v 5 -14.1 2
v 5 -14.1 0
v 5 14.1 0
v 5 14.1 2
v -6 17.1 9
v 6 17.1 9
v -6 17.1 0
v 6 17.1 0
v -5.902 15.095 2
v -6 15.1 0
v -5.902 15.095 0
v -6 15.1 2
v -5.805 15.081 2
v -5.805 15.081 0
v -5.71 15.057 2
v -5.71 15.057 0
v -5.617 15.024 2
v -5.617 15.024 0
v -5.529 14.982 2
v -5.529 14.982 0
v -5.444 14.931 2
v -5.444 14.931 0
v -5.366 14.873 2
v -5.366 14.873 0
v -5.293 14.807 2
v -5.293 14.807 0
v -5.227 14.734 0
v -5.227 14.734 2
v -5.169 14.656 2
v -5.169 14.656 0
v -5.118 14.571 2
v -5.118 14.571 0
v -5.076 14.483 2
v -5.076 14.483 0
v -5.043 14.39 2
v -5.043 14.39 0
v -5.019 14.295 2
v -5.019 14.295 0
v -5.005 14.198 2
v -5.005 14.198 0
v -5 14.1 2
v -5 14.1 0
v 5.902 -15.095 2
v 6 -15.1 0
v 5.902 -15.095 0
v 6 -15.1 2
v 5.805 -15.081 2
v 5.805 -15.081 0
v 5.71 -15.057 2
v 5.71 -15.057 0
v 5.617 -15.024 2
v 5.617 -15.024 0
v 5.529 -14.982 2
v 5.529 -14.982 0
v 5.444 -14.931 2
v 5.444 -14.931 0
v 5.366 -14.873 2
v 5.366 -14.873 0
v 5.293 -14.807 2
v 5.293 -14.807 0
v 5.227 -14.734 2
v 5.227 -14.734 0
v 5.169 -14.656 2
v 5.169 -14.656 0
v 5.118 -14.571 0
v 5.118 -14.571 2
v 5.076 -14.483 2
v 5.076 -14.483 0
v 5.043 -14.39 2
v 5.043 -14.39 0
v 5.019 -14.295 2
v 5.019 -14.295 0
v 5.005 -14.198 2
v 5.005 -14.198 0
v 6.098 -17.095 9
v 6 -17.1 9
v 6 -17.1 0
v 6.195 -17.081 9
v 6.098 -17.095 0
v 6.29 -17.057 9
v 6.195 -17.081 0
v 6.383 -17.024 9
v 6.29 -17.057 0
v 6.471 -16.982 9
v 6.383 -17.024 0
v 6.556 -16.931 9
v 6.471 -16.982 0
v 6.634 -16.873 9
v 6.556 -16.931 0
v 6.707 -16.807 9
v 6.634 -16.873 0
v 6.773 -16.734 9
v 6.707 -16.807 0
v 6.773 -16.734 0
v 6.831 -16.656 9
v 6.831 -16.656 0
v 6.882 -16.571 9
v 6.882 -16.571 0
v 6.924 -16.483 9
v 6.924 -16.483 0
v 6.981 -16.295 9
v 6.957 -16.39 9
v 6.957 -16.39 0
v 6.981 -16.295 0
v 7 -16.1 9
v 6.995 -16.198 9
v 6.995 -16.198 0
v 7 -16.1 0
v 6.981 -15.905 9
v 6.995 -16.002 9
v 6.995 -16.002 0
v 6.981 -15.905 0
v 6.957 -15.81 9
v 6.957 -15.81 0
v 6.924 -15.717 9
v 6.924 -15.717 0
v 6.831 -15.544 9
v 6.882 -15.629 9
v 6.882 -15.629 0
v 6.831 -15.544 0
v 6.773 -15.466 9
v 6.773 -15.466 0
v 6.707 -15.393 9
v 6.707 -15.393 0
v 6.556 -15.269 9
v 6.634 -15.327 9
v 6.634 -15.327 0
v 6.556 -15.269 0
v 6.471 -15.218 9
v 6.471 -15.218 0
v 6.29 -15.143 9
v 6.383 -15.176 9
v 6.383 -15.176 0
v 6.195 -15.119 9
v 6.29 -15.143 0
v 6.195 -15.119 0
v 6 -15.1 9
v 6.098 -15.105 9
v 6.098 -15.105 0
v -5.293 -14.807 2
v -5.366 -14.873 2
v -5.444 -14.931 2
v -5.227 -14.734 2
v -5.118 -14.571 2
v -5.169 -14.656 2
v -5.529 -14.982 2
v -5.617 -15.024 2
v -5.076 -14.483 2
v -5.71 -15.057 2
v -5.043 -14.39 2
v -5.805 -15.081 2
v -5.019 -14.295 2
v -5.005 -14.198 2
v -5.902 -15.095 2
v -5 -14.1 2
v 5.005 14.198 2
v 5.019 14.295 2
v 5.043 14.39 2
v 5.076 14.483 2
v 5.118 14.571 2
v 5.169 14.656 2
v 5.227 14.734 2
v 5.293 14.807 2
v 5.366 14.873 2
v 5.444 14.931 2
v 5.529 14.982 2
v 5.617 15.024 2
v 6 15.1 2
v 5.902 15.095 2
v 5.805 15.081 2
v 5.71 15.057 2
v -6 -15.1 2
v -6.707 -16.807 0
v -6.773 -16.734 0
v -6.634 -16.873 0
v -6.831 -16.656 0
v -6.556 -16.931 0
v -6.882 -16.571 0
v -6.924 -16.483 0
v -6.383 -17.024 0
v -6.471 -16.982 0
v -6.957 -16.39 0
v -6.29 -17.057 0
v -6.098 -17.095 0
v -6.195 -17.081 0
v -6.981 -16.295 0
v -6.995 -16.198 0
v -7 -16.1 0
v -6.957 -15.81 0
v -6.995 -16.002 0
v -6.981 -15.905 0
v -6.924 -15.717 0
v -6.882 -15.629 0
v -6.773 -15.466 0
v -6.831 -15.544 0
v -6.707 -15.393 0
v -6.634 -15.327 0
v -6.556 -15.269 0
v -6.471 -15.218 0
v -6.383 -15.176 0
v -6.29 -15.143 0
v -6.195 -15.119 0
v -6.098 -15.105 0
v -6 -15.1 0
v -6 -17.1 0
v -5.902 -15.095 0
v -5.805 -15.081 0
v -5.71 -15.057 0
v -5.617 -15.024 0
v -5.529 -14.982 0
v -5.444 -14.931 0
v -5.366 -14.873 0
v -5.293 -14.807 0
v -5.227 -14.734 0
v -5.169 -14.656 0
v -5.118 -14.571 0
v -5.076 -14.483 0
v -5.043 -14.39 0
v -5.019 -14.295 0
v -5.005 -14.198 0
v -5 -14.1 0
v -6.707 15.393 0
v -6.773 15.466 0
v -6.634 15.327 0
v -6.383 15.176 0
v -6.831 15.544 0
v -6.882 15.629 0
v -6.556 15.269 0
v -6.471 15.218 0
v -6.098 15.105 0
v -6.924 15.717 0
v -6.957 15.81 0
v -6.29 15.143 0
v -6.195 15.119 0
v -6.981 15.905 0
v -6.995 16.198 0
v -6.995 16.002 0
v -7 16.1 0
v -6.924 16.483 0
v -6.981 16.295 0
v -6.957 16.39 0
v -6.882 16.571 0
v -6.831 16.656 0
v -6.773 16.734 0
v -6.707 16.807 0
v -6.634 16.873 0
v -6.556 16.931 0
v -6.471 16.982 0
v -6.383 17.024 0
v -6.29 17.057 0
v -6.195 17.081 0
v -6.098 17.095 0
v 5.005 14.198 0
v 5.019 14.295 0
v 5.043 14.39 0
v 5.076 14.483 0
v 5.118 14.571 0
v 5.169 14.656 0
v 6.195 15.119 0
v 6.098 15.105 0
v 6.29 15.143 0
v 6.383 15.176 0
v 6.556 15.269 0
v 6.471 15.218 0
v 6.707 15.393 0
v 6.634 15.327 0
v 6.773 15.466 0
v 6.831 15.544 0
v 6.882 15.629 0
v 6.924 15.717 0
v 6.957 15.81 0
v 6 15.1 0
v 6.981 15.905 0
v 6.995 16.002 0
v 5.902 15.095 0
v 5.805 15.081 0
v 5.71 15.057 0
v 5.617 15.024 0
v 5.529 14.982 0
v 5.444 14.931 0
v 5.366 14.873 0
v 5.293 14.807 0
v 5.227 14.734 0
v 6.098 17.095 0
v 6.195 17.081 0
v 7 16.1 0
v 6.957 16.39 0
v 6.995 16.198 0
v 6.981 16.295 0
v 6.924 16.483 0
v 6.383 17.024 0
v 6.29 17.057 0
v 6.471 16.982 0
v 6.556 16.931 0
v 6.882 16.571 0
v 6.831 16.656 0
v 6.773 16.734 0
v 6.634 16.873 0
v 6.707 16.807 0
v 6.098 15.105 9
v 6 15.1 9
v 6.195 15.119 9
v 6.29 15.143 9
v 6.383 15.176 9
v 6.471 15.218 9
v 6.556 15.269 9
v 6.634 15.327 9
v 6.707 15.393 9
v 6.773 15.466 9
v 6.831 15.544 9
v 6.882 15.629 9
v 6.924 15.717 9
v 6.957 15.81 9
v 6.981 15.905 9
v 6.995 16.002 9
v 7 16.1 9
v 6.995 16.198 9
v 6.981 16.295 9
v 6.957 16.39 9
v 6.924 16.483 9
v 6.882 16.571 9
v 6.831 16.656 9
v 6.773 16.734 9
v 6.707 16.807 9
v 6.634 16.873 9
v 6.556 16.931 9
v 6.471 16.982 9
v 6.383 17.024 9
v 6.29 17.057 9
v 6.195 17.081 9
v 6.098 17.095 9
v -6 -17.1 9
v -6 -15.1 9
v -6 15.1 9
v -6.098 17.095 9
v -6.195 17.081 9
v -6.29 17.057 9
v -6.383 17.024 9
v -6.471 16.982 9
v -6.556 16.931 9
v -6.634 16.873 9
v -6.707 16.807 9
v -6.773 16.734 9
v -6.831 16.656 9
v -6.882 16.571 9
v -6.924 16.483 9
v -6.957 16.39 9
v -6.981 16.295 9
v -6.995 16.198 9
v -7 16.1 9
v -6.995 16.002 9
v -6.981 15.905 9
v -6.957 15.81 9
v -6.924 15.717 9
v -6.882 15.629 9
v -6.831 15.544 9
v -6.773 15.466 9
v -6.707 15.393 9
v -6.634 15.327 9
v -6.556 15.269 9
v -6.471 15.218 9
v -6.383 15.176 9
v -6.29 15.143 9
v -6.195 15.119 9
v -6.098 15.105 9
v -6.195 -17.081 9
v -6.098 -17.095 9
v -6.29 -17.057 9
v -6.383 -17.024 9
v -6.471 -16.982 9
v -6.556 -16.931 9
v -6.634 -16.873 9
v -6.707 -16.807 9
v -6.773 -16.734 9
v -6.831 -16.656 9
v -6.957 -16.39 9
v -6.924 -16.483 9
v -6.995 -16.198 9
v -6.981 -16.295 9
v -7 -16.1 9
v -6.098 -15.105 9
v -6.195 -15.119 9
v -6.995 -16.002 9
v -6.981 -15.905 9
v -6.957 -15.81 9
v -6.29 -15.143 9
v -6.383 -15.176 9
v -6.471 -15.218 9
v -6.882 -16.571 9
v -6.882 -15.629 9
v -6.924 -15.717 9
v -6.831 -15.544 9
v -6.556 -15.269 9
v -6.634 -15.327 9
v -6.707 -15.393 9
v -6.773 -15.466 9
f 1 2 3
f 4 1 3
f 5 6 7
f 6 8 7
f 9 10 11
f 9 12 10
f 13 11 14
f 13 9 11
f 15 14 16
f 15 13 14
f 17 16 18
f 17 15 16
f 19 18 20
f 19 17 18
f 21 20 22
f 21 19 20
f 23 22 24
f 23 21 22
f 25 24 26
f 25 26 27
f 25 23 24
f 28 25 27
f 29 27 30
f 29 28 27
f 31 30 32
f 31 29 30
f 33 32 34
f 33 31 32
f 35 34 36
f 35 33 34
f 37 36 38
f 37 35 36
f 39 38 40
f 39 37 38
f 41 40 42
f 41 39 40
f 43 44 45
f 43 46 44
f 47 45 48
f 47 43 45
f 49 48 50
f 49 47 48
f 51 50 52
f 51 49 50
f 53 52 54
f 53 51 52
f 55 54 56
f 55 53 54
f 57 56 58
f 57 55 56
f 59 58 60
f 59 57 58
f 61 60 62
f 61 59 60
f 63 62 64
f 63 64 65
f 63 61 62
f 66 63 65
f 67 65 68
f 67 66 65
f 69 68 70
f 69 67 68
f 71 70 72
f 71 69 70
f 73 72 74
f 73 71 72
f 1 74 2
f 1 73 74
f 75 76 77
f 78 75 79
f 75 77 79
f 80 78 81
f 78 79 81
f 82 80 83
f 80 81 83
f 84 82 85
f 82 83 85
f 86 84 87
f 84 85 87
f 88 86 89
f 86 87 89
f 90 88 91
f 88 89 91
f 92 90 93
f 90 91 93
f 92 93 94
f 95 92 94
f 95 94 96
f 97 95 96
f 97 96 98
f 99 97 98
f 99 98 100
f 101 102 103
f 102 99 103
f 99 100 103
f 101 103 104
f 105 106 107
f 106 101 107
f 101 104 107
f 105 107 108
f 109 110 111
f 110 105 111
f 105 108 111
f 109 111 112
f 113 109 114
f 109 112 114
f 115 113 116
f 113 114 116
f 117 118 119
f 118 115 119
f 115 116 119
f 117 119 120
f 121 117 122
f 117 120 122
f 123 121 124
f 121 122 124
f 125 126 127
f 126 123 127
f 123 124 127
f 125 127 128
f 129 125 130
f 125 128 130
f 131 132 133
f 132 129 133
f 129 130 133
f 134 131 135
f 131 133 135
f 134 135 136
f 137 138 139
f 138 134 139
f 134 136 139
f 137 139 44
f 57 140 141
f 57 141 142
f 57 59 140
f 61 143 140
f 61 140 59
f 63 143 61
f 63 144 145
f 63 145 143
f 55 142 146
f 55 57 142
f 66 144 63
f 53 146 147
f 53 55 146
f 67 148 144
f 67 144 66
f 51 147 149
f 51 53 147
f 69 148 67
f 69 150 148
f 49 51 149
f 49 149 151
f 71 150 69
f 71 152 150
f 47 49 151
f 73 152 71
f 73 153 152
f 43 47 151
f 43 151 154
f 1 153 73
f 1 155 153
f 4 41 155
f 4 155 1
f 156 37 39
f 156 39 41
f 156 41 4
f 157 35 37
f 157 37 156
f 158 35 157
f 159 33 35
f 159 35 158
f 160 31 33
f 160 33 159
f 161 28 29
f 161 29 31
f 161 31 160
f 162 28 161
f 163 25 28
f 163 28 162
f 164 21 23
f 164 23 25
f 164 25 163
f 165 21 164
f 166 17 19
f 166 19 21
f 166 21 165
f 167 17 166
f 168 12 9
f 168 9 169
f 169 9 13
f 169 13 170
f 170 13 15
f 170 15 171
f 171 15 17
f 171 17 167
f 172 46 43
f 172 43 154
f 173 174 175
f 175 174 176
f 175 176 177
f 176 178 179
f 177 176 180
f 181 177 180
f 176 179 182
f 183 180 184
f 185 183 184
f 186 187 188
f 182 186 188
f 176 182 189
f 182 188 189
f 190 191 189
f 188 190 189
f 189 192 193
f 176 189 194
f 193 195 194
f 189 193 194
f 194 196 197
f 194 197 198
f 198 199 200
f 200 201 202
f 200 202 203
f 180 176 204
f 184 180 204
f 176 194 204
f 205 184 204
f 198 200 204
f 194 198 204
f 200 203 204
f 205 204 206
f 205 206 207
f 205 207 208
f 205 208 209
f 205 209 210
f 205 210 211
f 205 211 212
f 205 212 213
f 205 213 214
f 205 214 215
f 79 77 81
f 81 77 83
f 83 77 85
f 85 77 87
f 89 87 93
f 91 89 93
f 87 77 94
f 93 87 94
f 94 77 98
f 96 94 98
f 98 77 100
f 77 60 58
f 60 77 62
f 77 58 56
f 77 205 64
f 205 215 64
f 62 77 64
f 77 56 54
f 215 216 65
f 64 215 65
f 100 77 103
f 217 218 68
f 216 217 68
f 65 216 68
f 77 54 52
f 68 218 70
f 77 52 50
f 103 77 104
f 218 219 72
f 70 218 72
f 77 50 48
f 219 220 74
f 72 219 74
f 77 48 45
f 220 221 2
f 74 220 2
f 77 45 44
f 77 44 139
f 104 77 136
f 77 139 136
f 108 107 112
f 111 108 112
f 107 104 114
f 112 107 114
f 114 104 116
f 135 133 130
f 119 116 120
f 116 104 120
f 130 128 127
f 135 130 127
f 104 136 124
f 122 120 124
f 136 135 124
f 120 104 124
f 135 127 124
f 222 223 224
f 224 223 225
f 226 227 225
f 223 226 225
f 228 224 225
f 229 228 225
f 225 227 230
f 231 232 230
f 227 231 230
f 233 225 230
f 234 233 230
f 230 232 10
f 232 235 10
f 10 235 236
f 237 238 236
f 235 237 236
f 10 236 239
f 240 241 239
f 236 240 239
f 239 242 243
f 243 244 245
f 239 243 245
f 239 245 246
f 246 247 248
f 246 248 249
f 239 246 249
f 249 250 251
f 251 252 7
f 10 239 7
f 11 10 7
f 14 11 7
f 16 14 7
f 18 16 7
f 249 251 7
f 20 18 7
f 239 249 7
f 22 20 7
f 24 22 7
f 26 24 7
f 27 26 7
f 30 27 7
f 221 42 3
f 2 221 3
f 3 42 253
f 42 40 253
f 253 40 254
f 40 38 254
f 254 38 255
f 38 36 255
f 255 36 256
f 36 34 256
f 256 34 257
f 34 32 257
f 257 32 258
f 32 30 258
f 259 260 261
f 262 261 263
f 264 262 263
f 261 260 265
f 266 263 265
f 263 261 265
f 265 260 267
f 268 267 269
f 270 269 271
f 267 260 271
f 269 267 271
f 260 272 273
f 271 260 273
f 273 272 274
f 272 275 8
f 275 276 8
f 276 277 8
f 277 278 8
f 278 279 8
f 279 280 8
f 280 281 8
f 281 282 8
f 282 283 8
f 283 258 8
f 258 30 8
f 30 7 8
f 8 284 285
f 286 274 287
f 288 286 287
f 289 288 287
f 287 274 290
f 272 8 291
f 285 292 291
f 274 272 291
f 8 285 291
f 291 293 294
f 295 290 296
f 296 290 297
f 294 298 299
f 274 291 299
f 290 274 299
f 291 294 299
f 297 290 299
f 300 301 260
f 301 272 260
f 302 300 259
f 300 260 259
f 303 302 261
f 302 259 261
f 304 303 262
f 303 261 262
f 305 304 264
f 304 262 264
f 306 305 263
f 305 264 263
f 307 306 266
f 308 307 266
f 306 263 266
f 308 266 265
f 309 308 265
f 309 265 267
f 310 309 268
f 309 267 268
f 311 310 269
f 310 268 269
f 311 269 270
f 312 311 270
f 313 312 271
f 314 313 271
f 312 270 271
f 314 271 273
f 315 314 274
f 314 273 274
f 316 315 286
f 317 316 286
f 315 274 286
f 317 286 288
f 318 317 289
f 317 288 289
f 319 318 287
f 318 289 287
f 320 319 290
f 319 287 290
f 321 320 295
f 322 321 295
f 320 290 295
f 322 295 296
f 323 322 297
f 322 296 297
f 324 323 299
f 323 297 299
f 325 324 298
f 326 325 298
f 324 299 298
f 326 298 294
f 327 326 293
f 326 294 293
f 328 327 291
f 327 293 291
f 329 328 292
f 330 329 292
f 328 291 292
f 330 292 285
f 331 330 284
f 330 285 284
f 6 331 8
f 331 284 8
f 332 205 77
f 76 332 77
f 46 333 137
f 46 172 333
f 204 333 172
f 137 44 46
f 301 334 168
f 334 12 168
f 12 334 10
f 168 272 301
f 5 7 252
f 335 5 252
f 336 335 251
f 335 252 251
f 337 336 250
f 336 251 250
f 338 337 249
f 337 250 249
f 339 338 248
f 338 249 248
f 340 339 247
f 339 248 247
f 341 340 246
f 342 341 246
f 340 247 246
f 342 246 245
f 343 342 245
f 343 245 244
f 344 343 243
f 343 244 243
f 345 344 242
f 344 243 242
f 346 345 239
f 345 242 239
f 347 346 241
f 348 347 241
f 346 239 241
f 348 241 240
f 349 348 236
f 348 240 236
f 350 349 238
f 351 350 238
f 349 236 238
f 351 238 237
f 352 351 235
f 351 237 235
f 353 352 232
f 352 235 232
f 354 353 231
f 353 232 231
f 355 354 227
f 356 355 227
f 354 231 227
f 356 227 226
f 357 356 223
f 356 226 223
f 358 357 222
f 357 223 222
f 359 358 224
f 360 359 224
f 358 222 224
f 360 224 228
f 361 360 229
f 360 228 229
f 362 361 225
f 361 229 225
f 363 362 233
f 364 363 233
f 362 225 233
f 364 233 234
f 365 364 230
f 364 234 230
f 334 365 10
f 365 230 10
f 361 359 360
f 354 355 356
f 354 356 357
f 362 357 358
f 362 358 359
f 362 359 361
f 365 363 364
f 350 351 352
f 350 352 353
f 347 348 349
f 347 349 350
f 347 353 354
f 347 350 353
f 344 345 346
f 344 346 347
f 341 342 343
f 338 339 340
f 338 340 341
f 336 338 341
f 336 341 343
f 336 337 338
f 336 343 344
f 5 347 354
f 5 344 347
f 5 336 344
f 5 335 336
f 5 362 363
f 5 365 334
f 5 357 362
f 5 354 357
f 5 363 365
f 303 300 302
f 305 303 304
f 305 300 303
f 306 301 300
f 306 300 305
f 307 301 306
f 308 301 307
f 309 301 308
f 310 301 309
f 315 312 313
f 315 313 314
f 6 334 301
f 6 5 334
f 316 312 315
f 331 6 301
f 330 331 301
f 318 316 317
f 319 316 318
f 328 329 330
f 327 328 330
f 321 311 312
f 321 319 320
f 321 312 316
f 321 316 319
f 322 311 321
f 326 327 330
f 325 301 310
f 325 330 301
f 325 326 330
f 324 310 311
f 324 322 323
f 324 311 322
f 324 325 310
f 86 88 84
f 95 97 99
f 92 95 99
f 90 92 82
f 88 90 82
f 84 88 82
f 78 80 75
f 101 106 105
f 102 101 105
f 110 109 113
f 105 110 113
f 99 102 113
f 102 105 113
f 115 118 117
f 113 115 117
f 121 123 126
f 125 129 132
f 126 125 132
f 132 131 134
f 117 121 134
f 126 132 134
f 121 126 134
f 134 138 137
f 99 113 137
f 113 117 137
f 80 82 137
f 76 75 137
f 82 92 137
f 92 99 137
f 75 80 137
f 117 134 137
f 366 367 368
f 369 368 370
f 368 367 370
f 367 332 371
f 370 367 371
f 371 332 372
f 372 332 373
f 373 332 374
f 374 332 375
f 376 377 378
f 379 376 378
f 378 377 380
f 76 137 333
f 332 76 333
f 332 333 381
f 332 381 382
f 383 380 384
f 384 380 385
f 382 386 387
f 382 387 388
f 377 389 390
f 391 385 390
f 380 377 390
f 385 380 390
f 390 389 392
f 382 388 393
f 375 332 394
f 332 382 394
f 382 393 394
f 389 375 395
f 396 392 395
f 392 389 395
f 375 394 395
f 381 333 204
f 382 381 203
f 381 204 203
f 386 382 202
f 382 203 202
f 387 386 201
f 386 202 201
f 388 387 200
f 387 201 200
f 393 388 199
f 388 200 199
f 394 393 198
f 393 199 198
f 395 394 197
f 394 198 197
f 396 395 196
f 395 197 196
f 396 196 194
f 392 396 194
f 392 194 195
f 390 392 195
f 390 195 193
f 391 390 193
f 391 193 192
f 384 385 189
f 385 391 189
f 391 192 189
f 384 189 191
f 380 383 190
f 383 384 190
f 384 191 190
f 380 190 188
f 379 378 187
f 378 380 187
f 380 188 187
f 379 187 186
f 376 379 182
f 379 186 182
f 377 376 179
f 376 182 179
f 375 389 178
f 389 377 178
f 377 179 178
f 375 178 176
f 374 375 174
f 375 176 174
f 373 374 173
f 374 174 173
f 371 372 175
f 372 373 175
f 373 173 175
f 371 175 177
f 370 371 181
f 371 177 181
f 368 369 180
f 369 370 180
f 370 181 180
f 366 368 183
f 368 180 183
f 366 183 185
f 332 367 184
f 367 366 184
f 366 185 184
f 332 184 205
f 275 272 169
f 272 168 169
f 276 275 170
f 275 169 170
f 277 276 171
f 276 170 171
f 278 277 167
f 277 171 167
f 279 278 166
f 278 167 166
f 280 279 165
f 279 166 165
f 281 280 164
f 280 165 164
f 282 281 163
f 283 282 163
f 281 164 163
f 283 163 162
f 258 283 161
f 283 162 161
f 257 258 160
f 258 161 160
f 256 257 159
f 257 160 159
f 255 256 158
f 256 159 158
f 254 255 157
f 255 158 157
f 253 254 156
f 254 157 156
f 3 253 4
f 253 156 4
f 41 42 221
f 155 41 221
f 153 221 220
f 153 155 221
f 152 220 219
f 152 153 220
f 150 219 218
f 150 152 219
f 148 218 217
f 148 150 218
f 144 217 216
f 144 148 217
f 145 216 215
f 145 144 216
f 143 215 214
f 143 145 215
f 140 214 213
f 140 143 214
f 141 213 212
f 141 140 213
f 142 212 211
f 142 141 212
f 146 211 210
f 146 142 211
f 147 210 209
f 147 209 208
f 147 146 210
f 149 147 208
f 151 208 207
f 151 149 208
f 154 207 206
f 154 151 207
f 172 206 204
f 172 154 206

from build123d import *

# Parameters (mm, degrees)
BOSS_EXTRUDE3_DEPTH = 2
BOSS_EXTRUDE4_DEPTH = 7
FILLET2_R           = 1


with BuildPart() as part:
    # Sketch1 → Boss-Extrude3 (new body)
    with BuildSketch(Plane.XY):
        with BuildLine():
            Line((-5, 15.1), (-5, 0.9))
            Line((-5, 0.9), (-5, -1.1))
            Line((-5, -1.1), (-5, -15.1))
            Line((-5, -15.1), (-6, -15.1))
            ThreePointArc((-6, -15.1), (-7, -16.1), (-6, -17.1))
            Line((-6, -17.1), (5, -17.1))
            Line((5, -17.1), (6, -17.1))
            ThreePointArc((6, -17.1), (7, -16.1), (6, -15.1))
            Line((6, -15.1), (5, -15.1))
            Line((5, -15.1), (5, -1.1))
            Line((5, -1.1), (5, 0.9))
            Line((5, 0.9), (5, 15.1))
            Line((5, 15.1), (6, 15.1))
            ThreePointArc((6, 15.1), (7, 16.1), (6, 17.1))
            Line((6, 17.1), (5, 17.1))
            Line((5, 17.1), (-5, 17.1))
            Line((-5, 17.1), (-6, 17.1))
            ThreePointArc((-6, 17.1), (-7, 16.1), (-6, 15.1))
            Line((-6, 15.1), (-5, 15.1))
        make_face()
    extrude(amount=BOSS_EXTRUDE3_DEPTH)

    # Sketch3 → Boss-Extrude4 (add)
    with BuildSketch(Plane.XY.offset(2)):
        with BuildLine():
            Line((-6, 15.1), (-5, 15.1))
            Line((-5, 15.1), (5, 15.1))
            Line((5, 15.1), (6, 15.1))
            ThreePointArc((6, 15.1), (7, 16.1), (6, 17.1))
            Line((6, 17.1), (-6, 17.1))
            ThreePointArc((-6, 17.1), (-7, 16.1), (-6, 15.1))
        make_face()
        with BuildLine():
            Line((-6, -15.1), (-5, -15.1))
            Line((-5, -15.1), (5, -15.1))
            Line((5, -15.1), (6, -15.1))
            ThreePointArc((6, -15.1), (7, -16.1), (6, -17.1))
            Line((6, -17.1), (-6, -17.1))
            ThreePointArc((-6, -17.1), (-7, -16.1), (-6, -15.1))
        make_face()
    extrude(amount=BOSS_EXTRUDE4_DEPTH)

    # Fillet2
    fillet2_edges = [part.edges().sort_by_distance(p)[0] for p in [
        (-5, 15.1, 1),
        (-5, -15.1, 1),
        (5, 15.1, 1),
        (5, -15.1, 1),
    ]]
    fillet(fillet2_edges, radius=FILLET2_R - 0.0001)  # a hair under: the kernel refuses the full size


solid = part.part
